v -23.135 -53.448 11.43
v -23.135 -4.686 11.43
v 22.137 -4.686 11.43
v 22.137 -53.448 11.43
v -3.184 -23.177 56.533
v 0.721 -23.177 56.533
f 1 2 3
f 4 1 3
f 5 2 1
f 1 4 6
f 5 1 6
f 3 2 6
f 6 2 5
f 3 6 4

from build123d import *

# Parameters (mm, degrees)
F0_W      = 55.562247
F0_H      = 56.532964
F1_DEPTH  = 55.88
F3_DEPTH  = 143.764
F5_DEPTH  = 45.466
F7_DEPTH  = 94.742
F9_DEPTH  = 254
F10_W     = 102.854468
F10_H     = 33.626976
F11_DEPTH = 128.524
F12_W     = 127.998766
F12_H     = 88.431828
F13_DEPTH = 11.43


with BuildPart() as f1:
    # F0 (on Front) → F1 (new body)
    with BuildSketch(Plane.XZ):
        with Locations((-1.708673, 28.266482)):
            Rectangle(F0_W, F0_H)
    extrude(amount=F1_DEPTH)

    # F2 (on Front) → F3 (cut)
    with BuildSketch(Plane.XZ):
        Polygon((0, 58.050822), (27.564345, 0), (27.564345, 58.050822), align=None)
    extrude(amount=F3_DEPTH, mode=Mode.SUBTRACT)

    # F4 (on Right) → F5 (cut, symmetric)
    with BuildSketch(Plane.YZ):
        Polygon((-62.023856, 67.624263), (-61.119623, 0), (-15.732997, 67.624263), align=None)
    extrude(amount=F5_DEPTH, both=True, mode=Mode.SUBTRACT)

    # F6 (on face) → F7 (cut)
    with BuildSketch(Plane(origin=(-29.489797, 0, 0), x_dir=(0, -1, 0), z_dir=(-1, 0, 0))):
        Polygon((0, 0), (23.177022, 56.532964), (0, 56.532964), align=None)
    extrude(amount=-F7_DEPTH, mode=Mode.SUBTRACT)

    # F8 (on Front) → F9 (cut)
    with BuildSketch(Plane.XZ):
        Polygon((-39.340276, 63.730873), (-28.191272, 0), (0, 63.730873), align=None)
    extrude(amount=F9_DEPTH, mode=Mode.SUBTRACT)

    # F10 (on Front) → F11 (cut)
    with BuildSketch(Plane.XZ):
        with Locations((-6.703854, -8.482341)):
            Rectangle(F10_W, F10_H)
    extrude(amount=F11_DEPTH, mode=Mode.SUBTRACT)

    # F12 (on Top) → F13 (cut)
    with BuildSketch(Plane.XY):
        with Locations((12.506837, -16.333792)):
            Rectangle(F12_W, F12_H)
    extrude(amount=F13_DEPTH, mode=Mode.SUBTRACT)


solid = f1.part
